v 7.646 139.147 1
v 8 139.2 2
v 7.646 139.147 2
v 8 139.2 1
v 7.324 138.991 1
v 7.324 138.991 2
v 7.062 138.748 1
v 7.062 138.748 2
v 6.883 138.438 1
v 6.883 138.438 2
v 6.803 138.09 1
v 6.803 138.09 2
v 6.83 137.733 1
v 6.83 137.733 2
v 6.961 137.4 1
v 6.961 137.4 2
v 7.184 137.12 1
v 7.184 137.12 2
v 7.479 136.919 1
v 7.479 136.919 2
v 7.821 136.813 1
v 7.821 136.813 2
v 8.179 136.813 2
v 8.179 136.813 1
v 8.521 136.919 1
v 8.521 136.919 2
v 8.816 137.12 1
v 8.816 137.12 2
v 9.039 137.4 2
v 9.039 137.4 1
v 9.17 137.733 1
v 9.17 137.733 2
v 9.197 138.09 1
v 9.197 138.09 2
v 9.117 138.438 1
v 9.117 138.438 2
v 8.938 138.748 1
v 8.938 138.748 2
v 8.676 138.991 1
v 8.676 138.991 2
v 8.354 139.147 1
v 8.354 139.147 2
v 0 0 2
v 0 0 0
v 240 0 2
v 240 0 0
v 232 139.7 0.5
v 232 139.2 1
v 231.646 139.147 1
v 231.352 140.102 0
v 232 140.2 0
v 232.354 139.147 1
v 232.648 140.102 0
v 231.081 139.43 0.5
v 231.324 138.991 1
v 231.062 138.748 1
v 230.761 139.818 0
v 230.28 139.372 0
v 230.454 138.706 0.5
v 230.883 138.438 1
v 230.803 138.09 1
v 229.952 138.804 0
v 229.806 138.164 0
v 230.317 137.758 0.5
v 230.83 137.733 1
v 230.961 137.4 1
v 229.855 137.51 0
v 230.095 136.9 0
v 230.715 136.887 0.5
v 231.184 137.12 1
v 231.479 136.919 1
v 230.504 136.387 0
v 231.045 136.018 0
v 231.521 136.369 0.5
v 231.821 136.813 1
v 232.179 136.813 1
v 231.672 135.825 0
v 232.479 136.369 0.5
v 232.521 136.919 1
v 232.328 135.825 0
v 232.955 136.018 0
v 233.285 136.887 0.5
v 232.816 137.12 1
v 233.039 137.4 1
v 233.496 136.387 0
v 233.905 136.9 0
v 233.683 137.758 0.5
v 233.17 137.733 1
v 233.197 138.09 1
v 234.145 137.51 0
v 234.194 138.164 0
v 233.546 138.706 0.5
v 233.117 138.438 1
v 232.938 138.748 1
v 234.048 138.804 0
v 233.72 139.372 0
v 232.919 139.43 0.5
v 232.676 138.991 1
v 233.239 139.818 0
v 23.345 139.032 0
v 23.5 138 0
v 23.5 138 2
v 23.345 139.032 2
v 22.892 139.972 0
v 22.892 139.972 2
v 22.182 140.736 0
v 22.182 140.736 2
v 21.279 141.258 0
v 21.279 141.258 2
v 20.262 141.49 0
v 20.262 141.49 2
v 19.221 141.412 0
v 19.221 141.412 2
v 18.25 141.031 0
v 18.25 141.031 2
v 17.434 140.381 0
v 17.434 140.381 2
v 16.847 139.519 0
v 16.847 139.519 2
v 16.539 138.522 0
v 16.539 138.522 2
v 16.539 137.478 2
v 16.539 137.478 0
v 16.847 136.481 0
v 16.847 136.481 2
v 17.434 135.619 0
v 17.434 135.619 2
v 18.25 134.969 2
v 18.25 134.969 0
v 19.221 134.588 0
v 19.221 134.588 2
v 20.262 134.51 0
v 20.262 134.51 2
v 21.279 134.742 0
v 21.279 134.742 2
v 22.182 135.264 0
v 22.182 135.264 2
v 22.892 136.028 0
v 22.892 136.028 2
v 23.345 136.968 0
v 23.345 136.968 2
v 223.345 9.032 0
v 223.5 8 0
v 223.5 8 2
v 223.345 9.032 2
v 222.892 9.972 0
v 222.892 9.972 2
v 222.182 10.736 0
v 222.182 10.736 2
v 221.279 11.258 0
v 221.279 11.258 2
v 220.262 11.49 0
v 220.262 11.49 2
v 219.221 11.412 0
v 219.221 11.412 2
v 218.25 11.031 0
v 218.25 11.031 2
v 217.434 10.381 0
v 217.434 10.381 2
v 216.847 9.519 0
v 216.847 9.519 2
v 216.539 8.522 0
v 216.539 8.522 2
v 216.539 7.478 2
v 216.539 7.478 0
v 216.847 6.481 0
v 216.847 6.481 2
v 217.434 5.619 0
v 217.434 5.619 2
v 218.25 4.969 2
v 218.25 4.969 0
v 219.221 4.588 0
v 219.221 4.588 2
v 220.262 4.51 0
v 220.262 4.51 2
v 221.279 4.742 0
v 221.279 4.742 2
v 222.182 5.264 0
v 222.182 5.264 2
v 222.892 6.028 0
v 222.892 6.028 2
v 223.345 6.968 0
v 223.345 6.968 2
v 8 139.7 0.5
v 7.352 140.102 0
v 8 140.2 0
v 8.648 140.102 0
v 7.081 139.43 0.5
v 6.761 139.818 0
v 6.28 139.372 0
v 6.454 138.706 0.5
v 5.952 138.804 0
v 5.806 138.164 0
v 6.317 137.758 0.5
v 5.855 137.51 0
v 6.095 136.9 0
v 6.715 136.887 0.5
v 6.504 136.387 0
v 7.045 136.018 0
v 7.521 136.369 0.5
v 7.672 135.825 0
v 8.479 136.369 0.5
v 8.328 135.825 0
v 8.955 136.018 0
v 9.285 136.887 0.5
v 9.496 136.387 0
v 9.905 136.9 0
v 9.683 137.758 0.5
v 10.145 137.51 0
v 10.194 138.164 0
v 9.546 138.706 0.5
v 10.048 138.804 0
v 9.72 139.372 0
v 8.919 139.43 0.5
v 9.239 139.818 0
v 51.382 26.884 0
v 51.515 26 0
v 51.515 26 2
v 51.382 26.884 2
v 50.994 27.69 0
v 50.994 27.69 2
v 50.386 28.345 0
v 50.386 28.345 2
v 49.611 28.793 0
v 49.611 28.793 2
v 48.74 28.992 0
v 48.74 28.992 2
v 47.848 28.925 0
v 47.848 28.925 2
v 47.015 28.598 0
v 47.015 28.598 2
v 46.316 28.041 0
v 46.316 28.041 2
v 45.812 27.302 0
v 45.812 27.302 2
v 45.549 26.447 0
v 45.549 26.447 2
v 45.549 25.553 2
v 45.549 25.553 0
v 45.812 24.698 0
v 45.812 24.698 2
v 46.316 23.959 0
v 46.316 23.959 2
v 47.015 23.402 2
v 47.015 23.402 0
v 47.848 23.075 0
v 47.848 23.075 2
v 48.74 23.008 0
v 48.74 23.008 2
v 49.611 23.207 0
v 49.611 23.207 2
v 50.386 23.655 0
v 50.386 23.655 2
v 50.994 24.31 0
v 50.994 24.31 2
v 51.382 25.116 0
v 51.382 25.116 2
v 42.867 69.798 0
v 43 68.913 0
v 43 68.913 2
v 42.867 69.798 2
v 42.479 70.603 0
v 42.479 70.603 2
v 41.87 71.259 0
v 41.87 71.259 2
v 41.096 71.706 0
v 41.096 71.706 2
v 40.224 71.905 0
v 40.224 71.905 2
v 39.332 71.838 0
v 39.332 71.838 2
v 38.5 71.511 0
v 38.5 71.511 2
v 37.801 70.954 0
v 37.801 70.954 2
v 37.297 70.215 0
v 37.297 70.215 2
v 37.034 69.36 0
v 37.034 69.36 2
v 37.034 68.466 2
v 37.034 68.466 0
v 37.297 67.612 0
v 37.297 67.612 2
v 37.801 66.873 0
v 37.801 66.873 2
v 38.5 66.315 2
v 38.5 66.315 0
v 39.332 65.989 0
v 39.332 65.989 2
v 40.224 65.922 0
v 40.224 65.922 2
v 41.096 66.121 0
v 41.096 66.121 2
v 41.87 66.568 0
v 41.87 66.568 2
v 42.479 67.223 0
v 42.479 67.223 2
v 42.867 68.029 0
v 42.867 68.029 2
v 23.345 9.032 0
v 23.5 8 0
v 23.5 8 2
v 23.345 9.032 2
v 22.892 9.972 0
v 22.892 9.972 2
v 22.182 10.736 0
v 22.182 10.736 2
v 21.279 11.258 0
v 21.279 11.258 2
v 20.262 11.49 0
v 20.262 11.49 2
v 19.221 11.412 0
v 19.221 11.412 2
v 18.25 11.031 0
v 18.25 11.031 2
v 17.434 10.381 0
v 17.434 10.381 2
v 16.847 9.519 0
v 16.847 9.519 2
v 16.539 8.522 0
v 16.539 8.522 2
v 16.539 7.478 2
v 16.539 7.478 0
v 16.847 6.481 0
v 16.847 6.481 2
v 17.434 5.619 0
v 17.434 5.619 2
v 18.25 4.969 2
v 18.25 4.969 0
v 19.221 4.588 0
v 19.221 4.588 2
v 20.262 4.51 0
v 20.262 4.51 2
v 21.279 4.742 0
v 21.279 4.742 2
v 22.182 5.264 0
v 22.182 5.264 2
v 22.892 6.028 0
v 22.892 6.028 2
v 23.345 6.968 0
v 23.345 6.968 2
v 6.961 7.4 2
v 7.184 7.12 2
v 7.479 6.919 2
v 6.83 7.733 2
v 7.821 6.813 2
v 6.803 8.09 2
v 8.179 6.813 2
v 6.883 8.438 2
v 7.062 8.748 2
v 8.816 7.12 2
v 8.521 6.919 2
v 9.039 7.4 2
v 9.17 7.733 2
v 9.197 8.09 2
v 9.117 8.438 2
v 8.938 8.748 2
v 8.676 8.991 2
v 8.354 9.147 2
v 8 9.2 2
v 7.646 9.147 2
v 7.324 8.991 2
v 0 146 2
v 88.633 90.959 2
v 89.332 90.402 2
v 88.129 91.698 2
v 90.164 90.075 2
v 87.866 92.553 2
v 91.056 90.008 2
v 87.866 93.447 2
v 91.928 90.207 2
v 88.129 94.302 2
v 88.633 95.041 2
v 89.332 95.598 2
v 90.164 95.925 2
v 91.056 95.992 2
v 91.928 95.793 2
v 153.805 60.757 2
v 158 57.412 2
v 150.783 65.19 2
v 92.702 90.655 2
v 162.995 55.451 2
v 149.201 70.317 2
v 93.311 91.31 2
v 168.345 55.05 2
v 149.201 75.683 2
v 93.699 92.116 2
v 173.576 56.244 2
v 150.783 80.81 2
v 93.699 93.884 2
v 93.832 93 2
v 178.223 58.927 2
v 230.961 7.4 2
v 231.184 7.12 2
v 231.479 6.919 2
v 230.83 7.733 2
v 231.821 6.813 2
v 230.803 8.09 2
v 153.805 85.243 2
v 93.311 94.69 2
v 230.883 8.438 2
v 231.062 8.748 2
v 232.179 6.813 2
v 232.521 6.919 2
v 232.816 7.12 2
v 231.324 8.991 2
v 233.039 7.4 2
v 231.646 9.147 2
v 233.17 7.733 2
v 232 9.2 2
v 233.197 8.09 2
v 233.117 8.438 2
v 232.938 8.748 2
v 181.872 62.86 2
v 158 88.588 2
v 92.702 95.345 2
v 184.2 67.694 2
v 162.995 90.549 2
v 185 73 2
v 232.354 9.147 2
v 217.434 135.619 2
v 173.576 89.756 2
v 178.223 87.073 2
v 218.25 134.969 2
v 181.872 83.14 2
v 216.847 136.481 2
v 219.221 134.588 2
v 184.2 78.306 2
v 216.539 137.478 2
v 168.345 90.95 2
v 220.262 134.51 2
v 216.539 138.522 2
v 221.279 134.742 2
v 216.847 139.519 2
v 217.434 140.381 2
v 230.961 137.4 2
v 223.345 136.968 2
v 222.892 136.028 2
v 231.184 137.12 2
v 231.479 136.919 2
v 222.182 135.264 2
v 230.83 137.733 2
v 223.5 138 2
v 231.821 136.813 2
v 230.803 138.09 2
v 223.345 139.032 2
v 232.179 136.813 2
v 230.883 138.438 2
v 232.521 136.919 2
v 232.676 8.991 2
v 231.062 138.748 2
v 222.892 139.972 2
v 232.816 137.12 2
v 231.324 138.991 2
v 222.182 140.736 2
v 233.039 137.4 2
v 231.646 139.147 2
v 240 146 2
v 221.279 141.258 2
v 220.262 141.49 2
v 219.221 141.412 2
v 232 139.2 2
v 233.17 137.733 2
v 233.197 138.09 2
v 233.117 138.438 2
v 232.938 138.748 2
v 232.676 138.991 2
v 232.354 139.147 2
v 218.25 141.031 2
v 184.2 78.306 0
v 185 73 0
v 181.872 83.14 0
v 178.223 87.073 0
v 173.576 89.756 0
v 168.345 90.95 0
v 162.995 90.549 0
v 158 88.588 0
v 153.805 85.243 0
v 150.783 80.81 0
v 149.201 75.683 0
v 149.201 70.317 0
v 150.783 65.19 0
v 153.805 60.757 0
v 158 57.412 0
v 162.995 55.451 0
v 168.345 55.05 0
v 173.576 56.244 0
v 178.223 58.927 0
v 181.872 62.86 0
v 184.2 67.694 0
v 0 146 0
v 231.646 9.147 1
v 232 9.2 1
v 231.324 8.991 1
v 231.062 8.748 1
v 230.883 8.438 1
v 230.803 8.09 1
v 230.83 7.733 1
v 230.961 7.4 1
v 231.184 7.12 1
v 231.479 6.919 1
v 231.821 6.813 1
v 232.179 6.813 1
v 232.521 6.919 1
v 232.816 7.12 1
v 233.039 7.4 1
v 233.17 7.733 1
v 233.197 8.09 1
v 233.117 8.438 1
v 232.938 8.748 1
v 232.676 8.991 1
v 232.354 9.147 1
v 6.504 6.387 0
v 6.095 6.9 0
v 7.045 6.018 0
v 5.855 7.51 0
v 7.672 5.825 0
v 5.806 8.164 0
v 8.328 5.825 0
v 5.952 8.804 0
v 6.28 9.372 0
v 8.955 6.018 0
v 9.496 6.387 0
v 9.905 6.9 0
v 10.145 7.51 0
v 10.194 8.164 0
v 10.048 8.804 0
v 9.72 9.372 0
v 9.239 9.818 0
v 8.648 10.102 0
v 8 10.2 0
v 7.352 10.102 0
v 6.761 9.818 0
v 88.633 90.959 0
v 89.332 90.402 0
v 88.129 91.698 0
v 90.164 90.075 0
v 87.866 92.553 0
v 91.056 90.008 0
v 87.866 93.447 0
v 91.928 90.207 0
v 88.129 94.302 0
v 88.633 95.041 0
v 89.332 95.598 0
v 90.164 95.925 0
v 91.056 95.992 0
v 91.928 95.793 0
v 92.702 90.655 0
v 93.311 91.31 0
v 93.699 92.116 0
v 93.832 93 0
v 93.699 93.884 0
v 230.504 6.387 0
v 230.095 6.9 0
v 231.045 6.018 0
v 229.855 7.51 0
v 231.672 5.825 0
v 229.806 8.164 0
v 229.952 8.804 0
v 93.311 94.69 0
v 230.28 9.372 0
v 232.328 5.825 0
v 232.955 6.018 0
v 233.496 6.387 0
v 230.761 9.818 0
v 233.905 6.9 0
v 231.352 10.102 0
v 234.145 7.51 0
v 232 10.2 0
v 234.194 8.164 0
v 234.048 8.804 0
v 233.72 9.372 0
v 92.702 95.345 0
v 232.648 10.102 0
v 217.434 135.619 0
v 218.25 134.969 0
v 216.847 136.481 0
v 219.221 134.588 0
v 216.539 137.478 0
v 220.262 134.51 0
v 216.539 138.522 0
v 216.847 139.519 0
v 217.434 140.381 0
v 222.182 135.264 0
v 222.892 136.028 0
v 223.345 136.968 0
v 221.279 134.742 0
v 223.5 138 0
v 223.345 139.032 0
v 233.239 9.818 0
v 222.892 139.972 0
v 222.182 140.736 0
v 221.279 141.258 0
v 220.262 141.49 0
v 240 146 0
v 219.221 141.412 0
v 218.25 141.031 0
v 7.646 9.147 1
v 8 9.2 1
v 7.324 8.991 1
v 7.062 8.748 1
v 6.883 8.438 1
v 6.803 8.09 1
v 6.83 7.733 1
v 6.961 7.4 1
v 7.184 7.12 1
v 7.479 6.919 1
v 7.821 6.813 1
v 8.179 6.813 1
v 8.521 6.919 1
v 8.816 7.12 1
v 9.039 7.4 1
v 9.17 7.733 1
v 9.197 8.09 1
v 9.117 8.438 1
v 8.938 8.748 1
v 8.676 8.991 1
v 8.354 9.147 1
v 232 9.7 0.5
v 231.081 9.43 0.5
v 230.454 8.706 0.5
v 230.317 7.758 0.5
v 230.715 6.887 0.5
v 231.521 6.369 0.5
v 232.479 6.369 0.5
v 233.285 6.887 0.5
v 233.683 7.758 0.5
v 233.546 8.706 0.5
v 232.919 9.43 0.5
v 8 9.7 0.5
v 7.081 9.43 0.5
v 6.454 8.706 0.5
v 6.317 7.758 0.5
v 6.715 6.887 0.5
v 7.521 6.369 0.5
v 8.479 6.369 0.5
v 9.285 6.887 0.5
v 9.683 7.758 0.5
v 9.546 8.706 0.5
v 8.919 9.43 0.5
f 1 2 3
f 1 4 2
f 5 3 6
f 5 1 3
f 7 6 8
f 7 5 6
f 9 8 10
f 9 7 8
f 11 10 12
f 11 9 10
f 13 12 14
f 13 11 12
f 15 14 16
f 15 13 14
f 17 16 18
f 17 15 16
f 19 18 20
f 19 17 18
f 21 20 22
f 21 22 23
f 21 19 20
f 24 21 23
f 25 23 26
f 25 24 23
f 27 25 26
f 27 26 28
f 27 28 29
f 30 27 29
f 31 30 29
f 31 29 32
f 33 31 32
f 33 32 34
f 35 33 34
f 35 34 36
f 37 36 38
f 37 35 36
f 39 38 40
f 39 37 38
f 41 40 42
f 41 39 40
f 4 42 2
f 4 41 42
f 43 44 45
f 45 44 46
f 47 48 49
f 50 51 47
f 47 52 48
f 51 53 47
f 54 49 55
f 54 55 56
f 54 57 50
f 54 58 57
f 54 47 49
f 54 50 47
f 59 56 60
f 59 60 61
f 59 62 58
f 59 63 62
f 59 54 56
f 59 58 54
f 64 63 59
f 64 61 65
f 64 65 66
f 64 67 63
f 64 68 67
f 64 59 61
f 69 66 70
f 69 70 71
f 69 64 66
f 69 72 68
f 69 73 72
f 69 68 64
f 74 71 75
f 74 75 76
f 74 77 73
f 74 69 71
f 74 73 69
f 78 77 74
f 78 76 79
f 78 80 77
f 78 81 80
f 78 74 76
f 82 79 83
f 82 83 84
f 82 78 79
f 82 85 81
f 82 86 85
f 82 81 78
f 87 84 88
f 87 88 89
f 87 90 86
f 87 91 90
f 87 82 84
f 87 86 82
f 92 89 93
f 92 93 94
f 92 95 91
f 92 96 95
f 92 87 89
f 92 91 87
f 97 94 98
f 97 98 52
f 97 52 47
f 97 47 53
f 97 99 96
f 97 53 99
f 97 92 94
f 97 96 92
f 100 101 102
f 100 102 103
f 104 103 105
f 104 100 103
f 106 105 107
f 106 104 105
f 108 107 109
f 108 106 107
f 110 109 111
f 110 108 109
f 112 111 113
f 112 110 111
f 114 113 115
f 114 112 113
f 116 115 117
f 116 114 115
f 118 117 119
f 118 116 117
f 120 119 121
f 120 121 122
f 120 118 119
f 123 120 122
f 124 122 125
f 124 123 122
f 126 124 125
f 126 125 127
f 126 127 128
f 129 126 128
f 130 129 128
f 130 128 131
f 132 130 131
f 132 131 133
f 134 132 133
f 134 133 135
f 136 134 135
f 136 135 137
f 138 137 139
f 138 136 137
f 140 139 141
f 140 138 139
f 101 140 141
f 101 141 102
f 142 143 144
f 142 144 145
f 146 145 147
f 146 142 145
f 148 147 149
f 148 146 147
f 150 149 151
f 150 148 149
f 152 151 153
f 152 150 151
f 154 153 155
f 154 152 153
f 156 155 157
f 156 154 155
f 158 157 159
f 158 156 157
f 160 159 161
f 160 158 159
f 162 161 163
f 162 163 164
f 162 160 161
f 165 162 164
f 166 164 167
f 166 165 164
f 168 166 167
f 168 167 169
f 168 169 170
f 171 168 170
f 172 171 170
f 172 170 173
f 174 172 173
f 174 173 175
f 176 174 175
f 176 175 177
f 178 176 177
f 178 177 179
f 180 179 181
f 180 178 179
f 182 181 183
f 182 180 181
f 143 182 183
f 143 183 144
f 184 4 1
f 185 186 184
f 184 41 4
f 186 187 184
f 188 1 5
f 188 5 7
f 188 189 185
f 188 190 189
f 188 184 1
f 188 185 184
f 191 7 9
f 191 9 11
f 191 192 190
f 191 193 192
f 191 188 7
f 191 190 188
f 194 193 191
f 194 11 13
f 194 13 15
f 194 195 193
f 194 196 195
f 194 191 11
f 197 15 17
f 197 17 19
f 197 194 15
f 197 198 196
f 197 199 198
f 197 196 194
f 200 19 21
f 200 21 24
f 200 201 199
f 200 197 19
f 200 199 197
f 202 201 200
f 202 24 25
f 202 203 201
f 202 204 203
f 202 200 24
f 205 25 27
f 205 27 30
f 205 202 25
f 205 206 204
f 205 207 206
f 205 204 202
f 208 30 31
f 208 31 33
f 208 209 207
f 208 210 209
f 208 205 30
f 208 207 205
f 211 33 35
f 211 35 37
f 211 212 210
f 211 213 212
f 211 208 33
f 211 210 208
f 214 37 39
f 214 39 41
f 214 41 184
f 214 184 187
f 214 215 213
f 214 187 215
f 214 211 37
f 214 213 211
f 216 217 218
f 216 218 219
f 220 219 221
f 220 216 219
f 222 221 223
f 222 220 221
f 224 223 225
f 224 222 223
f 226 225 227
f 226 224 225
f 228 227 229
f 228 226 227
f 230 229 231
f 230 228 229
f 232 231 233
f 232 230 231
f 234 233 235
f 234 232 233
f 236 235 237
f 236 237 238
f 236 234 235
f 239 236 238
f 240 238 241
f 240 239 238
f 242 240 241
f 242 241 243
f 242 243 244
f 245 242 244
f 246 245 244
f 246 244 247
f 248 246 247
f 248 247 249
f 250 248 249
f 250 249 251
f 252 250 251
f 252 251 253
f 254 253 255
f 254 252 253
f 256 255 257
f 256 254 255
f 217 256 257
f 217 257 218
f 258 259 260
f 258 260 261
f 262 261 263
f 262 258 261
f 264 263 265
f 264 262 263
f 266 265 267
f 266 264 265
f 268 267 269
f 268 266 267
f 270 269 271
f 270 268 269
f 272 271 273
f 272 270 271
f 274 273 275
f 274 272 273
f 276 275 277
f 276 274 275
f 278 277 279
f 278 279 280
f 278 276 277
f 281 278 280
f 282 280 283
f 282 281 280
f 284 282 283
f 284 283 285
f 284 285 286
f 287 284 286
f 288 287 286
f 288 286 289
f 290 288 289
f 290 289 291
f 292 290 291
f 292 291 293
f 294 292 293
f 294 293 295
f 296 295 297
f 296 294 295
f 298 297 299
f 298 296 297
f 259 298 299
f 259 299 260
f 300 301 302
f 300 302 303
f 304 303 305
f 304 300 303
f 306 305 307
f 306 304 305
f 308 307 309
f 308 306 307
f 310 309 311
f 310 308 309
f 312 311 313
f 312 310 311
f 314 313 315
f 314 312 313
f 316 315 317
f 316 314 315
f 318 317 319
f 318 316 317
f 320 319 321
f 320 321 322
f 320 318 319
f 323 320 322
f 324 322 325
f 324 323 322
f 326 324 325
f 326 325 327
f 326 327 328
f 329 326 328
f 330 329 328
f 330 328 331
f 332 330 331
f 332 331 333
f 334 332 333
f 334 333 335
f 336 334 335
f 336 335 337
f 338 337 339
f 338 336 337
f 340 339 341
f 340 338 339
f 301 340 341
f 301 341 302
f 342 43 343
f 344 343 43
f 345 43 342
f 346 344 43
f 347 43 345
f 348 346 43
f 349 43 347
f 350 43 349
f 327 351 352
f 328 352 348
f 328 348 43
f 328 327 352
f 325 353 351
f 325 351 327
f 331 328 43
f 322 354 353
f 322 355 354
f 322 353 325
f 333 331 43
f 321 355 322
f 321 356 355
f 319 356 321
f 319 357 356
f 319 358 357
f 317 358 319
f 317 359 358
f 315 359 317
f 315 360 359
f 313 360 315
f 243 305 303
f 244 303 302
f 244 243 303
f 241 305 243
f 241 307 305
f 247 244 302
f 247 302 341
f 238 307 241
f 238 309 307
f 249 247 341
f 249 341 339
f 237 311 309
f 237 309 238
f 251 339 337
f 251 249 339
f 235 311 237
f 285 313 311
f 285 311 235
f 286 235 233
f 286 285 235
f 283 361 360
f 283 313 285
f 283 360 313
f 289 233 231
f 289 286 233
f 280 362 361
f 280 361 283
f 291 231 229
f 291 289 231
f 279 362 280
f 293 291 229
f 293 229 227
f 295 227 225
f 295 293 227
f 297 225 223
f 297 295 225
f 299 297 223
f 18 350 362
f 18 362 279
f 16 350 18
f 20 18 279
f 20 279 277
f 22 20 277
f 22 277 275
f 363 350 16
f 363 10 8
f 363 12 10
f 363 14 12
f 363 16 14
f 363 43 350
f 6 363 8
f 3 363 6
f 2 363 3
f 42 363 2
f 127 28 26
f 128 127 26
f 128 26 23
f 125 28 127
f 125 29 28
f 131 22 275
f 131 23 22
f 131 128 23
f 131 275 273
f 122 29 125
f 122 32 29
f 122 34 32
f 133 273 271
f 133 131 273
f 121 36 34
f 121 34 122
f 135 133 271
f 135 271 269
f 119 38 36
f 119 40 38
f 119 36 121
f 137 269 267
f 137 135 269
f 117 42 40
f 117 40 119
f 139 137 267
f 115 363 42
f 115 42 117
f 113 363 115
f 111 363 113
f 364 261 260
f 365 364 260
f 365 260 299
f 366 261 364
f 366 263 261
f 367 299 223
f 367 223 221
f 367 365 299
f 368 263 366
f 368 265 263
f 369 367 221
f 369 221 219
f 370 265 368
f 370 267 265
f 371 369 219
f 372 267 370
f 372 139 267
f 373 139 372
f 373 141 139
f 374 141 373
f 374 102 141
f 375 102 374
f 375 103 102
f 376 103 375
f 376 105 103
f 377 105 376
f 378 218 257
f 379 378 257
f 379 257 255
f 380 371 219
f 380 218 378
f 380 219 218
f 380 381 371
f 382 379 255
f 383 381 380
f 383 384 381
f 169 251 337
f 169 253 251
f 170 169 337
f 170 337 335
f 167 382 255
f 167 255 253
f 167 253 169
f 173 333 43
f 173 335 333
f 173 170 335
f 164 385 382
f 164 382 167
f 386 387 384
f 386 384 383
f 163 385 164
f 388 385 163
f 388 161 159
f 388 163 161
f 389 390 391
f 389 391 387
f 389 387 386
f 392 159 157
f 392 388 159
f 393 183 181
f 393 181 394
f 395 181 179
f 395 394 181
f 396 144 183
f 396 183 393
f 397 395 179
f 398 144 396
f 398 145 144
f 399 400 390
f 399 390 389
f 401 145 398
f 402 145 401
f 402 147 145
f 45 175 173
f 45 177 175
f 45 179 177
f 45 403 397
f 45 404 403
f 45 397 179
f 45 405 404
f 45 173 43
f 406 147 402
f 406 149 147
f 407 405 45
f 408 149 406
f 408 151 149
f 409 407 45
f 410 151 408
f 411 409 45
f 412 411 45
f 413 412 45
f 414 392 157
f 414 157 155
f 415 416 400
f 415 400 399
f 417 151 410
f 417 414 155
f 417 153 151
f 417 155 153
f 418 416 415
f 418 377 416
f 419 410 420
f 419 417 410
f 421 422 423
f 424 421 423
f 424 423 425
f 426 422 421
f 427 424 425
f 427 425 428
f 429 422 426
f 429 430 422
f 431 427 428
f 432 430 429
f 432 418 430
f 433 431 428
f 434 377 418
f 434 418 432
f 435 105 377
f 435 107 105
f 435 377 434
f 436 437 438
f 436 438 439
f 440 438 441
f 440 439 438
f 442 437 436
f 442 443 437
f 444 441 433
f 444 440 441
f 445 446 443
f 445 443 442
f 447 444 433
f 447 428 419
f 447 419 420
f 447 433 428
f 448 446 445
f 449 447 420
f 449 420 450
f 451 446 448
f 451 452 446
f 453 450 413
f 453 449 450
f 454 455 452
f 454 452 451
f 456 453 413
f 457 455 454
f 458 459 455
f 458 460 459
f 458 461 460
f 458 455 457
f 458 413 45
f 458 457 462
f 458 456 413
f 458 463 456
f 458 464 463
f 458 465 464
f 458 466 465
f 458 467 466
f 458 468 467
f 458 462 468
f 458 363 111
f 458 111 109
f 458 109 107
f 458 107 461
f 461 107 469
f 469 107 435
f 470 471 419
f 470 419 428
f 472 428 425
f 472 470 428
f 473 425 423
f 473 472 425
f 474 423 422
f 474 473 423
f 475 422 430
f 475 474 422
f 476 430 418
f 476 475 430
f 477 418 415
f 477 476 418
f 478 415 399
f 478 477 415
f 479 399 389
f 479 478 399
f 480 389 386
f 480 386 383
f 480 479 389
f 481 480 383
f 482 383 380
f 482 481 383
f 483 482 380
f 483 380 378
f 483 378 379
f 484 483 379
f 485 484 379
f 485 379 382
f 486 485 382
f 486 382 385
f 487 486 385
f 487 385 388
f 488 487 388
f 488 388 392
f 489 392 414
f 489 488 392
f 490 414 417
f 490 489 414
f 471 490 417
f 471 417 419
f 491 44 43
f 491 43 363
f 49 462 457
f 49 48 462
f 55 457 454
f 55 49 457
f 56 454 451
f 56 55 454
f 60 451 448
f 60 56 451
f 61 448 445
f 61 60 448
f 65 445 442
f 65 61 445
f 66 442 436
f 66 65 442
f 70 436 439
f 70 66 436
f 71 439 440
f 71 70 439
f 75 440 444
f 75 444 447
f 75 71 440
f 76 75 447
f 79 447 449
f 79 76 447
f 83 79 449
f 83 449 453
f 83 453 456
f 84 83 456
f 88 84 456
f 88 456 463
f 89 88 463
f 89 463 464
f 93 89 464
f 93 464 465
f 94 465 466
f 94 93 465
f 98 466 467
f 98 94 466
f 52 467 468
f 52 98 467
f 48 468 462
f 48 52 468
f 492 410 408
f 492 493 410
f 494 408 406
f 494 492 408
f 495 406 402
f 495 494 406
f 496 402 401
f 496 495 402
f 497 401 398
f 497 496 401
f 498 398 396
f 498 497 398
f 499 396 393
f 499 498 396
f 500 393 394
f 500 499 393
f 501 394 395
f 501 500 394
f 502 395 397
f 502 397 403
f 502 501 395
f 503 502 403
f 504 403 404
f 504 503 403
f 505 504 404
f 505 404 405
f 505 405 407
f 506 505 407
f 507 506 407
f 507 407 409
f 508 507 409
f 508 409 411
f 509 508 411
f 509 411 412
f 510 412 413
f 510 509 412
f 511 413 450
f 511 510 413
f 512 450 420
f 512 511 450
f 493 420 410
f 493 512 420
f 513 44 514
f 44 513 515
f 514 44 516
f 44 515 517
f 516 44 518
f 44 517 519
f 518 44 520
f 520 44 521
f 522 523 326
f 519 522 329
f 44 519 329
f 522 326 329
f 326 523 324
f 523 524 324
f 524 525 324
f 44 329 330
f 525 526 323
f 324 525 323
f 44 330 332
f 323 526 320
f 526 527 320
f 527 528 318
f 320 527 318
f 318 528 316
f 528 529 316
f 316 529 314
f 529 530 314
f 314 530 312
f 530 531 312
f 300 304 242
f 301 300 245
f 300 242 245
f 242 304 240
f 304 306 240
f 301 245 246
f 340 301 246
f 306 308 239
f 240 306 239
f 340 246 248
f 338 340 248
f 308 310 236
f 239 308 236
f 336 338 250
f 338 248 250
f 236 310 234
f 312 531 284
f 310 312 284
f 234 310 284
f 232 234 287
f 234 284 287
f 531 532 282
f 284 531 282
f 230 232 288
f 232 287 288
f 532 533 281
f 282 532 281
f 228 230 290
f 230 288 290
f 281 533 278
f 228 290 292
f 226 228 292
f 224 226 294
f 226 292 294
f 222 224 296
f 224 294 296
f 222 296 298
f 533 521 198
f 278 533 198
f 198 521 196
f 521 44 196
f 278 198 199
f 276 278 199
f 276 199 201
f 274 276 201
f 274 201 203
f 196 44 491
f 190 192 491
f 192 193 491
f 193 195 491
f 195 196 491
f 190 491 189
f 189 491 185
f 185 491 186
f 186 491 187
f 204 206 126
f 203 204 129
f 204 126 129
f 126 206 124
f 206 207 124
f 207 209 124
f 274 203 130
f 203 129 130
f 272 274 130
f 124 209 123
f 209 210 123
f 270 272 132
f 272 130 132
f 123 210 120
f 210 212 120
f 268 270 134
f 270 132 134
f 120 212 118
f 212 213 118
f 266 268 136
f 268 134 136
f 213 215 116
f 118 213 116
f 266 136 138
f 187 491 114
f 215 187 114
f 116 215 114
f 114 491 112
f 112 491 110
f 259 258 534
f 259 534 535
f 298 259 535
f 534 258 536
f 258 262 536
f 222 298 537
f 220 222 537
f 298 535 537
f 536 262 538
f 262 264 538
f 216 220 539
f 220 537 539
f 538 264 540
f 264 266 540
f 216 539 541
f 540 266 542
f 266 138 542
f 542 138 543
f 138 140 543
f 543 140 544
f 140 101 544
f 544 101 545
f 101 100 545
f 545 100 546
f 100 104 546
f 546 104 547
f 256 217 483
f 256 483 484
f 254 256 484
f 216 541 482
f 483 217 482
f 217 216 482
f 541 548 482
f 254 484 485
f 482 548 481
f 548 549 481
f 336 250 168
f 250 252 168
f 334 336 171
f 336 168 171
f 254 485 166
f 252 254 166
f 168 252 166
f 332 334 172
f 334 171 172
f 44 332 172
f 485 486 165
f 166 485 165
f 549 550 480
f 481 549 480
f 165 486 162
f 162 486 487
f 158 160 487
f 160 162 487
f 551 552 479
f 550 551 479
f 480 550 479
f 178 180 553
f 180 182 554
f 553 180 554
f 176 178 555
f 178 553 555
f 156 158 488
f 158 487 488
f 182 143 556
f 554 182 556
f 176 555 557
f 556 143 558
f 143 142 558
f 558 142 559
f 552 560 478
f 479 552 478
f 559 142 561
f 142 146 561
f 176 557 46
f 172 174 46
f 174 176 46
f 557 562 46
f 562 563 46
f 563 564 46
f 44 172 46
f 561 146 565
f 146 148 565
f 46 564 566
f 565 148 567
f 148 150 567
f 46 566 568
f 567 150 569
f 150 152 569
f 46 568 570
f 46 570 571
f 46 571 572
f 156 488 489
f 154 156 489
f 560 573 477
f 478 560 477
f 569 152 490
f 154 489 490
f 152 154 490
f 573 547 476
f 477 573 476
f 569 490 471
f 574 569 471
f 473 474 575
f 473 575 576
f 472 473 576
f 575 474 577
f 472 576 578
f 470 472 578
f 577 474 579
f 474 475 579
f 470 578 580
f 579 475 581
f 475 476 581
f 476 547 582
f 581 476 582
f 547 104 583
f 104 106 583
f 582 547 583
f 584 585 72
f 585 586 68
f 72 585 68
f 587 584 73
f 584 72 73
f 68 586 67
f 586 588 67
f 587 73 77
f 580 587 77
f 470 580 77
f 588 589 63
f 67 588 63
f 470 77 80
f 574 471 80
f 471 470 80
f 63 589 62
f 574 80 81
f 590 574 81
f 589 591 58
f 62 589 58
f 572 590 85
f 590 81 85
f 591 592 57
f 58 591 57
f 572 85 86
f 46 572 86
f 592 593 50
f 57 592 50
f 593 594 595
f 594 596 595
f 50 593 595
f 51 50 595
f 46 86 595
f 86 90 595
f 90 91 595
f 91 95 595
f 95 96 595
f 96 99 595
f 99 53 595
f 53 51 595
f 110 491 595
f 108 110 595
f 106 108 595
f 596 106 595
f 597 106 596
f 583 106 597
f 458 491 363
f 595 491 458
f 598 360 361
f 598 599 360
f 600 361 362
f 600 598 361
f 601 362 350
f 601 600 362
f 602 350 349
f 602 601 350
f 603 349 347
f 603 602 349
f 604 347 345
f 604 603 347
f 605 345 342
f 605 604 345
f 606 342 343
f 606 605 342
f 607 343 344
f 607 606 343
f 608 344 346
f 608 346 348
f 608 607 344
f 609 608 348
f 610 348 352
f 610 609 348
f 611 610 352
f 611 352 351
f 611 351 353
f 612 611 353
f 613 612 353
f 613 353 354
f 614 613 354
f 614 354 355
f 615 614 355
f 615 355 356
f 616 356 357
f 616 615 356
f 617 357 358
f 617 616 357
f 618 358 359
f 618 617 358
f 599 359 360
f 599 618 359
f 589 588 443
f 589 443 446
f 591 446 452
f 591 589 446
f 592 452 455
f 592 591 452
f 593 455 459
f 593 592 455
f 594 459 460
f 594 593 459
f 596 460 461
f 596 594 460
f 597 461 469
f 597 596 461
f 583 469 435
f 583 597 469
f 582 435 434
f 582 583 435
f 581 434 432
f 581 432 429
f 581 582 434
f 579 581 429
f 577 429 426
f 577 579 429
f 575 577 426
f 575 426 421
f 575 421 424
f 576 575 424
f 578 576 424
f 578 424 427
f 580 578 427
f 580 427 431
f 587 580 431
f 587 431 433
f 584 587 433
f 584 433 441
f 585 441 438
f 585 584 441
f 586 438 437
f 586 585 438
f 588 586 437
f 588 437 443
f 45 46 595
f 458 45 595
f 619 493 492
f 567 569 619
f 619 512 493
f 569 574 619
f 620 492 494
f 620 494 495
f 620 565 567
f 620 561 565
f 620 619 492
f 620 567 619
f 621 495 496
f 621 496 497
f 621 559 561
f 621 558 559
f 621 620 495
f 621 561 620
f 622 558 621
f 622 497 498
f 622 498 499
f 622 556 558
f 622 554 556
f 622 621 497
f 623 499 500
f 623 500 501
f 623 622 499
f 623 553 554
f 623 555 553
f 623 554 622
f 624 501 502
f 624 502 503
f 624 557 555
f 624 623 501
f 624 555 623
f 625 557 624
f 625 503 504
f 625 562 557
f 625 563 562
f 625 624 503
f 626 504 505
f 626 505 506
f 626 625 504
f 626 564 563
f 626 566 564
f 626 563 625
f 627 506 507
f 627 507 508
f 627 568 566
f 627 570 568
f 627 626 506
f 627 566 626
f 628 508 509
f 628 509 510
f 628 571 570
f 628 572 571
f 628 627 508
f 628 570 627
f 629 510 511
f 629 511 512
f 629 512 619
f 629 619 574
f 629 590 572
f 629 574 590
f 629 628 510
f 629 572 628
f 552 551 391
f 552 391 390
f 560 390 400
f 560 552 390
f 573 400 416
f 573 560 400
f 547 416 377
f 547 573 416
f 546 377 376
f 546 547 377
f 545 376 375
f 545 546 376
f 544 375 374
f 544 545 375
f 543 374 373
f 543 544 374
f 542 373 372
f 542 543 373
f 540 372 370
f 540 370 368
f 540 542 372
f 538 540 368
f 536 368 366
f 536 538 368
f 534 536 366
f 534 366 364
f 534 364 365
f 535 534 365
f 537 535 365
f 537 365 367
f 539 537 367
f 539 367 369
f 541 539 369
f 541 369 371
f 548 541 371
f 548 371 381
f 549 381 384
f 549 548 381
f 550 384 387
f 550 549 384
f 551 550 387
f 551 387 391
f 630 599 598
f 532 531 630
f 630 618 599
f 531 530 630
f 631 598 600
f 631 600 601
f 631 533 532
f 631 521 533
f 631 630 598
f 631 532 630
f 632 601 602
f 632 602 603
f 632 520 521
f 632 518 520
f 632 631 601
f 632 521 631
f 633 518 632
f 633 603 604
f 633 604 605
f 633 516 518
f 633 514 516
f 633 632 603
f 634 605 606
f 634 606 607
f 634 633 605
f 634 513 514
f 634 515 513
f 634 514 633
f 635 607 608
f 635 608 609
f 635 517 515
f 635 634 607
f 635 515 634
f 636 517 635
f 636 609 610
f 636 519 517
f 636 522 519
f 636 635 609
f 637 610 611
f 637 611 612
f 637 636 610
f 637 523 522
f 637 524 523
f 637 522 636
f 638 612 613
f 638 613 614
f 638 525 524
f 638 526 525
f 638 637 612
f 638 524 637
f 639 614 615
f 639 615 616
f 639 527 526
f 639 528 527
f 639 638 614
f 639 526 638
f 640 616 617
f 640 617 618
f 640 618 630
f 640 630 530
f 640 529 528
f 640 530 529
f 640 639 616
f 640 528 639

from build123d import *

# Parameters (mm, degrees)
SKETCH_1_W                 = 240
SKETCH_1_H                 = 146
SKETCH_1_R                 = 3
SKETCH_1_R_2               = 18
SKETCH_1_R_3               = 3.5
EXTRUDE_1_DEPTH            = 2
HOLE_WIZARD_M21_AT_2_COUNT = 2
HOLE_WIZARD_M21_AT_2_PITCH = 224
HOLE_WIZARD_M21_AT_3_COUNT = 2
HOLE_WIZARD_M21_AT_3_PITCH = 258.99034731
HOLE_WIZARD_M21_AT_4_COUNT = 2
HOLE_WIZARD_M21_AT_4_PITCH = 130


with BuildPart() as part:
    # Эскиз1 → Бобышка-Вытянуть1 (new body)
    with BuildSketch(Plane.XY):
        with Locations((120, 73)):
            Rectangle(SKETCH_1_W, SKETCH_1_H)
        with Locations((48.515350749, 26)):
            Circle(SKETCH_1_R, mode=Mode.SUBTRACT)
        with Locations((40, 68.913299822)):
            Circle(SKETCH_1_R, mode=Mode.SUBTRACT)
        with Locations((90.832011317, 93)):
            Circle(SKETCH_1_R, mode=Mode.SUBTRACT)
        with Locations((167, 73)):
            Circle(SKETCH_1_R_2, mode=Mode.SUBTRACT)
        with Locations((20, 138)):
            Circle(SKETCH_1_R_3, mode=Mode.SUBTRACT)
        with Locations((20, 8)):
            Circle(SKETCH_1_R_3, mode=Mode.SUBTRACT)
        with Locations((220, 8)):
            Circle(SKETCH_1_R_3, mode=Mode.SUBTRACT)
        with Locations((220, 138)):
            Circle(SKETCH_1_R_3, mode=Mode.SUBTRACT)
    extrude(amount=EXTRUDE_1_DEPTH)

    # Эскиз5 → Зенковка для винта с полупотайной головкой M21 (revolve, cut)
    with BuildSketch(Plane(origin=(232, 138, 0), x_dir=(0, 1, 0), z_dir=(1, 0, 0))):
        Polygon((0, 0), (0, 2), (1.2, 2), (1.2, 1), (2.2, 0), align=None)
    hole_wizard_m21 = revolve(axis=Axis((232, 138, -6.35), (0, 0, 1)), mode=Mode.SUBTRACT)

    # Зенковка для винта с полупотайной головкой M21 at 2: Зенковка для винта с полупотайной головкой M21 ×2
    with Locations(*[(-i * HOLE_WIZARD_M21_AT_2_PITCH, 0, 0) for i in range(1, HOLE_WIZARD_M21_AT_2_COUNT)]):
        add(hole_wizard_m21, mode=Mode.SUBTRACT)

    # Зенковка для винта с полупотайной головкой M21 at 3: Зенковка для винта с полупотайной головкой M21 ×2
    with Locations(*[Vector(-0.864897099, -0.501949209, 0) * (i * HOLE_WIZARD_M21_AT_3_PITCH) for i in range(1, HOLE_WIZARD_M21_AT_3_COUNT)]):
        add(hole_wizard_m21, mode=Mode.SUBTRACT)

    # Зенковка для винта с полупотайной головкой M21 at 4: Зенковка для винта с полупотайной головкой M21 ×2
    with Locations(*[(0, -i * HOLE_WIZARD_M21_AT_4_PITCH, 0) for i in range(1, HOLE_WIZARD_M21_AT_4_COUNT)]):
        add(hole_wizard_m21, mode=Mode.SUBTRACT)


solid = part.part
